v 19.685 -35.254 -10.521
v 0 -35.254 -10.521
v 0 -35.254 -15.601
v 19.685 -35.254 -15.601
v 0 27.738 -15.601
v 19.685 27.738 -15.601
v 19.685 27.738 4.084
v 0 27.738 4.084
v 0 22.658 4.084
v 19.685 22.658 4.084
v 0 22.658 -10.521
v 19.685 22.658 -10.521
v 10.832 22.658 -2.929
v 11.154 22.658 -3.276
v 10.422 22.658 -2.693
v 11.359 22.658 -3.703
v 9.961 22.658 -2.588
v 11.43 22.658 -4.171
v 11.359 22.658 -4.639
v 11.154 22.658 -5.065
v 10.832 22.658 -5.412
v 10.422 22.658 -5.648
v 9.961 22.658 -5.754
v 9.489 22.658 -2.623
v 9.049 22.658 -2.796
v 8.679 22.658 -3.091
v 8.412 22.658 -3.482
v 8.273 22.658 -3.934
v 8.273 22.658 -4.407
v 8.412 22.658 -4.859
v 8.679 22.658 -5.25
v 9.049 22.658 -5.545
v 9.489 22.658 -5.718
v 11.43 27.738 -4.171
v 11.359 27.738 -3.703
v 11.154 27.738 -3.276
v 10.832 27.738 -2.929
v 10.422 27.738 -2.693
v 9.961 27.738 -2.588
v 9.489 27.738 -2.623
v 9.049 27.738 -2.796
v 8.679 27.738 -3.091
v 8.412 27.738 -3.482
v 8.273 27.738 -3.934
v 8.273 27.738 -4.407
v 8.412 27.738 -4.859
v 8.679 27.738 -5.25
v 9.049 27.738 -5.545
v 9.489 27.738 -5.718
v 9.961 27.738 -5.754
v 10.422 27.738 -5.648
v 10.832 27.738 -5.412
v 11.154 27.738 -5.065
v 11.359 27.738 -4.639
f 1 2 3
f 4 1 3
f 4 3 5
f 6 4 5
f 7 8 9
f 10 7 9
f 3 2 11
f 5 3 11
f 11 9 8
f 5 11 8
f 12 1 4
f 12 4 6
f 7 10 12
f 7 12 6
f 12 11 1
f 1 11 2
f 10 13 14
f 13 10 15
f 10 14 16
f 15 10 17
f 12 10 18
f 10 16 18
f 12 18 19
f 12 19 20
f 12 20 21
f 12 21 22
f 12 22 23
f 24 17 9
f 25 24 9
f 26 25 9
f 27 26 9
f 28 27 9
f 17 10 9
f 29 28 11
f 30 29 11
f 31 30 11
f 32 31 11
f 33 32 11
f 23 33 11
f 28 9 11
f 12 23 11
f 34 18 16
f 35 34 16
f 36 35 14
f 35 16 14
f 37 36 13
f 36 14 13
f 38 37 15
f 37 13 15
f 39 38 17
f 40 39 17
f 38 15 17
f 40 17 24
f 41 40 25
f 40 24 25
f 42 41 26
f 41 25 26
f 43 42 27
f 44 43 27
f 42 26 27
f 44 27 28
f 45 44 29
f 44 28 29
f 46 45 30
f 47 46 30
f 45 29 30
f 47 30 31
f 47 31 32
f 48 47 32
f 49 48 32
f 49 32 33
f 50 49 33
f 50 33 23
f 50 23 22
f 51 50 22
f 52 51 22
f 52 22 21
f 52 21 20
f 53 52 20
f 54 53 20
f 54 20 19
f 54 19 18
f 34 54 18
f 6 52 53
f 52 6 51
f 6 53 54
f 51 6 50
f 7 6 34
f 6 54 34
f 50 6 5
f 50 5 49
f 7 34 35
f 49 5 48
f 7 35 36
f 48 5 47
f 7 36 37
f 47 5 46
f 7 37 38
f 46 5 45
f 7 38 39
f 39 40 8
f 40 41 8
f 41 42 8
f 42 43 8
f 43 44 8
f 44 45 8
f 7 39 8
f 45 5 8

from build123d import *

# Parameters (mm, degrees)
F1_DEPTH = 19.685
F3_D     = 3.175


with BuildPart() as f1:
    # F0 (on Right) → F1 (new body)
    with BuildSketch(Plane.YZ):
        Polygon((-35.253628, -10.520633), (-35.253628, -15.600633), (27.738372, -15.600633), (27.738372, 4.084367), (22.658372, 4.084367), (22.658372, -10.520633), align=None)
    extrude(amount=F1_DEPTH)

    # F3 (through all)
    with Locations(Plane(origin=(0, 27.738372, 0), x_dir=(-1, 0, 0), z_dir=(0, 1, 0))):
        with Locations((-9.8425, -4.170633)):
            Hole(F3_D / 2)


solid = f1.part
